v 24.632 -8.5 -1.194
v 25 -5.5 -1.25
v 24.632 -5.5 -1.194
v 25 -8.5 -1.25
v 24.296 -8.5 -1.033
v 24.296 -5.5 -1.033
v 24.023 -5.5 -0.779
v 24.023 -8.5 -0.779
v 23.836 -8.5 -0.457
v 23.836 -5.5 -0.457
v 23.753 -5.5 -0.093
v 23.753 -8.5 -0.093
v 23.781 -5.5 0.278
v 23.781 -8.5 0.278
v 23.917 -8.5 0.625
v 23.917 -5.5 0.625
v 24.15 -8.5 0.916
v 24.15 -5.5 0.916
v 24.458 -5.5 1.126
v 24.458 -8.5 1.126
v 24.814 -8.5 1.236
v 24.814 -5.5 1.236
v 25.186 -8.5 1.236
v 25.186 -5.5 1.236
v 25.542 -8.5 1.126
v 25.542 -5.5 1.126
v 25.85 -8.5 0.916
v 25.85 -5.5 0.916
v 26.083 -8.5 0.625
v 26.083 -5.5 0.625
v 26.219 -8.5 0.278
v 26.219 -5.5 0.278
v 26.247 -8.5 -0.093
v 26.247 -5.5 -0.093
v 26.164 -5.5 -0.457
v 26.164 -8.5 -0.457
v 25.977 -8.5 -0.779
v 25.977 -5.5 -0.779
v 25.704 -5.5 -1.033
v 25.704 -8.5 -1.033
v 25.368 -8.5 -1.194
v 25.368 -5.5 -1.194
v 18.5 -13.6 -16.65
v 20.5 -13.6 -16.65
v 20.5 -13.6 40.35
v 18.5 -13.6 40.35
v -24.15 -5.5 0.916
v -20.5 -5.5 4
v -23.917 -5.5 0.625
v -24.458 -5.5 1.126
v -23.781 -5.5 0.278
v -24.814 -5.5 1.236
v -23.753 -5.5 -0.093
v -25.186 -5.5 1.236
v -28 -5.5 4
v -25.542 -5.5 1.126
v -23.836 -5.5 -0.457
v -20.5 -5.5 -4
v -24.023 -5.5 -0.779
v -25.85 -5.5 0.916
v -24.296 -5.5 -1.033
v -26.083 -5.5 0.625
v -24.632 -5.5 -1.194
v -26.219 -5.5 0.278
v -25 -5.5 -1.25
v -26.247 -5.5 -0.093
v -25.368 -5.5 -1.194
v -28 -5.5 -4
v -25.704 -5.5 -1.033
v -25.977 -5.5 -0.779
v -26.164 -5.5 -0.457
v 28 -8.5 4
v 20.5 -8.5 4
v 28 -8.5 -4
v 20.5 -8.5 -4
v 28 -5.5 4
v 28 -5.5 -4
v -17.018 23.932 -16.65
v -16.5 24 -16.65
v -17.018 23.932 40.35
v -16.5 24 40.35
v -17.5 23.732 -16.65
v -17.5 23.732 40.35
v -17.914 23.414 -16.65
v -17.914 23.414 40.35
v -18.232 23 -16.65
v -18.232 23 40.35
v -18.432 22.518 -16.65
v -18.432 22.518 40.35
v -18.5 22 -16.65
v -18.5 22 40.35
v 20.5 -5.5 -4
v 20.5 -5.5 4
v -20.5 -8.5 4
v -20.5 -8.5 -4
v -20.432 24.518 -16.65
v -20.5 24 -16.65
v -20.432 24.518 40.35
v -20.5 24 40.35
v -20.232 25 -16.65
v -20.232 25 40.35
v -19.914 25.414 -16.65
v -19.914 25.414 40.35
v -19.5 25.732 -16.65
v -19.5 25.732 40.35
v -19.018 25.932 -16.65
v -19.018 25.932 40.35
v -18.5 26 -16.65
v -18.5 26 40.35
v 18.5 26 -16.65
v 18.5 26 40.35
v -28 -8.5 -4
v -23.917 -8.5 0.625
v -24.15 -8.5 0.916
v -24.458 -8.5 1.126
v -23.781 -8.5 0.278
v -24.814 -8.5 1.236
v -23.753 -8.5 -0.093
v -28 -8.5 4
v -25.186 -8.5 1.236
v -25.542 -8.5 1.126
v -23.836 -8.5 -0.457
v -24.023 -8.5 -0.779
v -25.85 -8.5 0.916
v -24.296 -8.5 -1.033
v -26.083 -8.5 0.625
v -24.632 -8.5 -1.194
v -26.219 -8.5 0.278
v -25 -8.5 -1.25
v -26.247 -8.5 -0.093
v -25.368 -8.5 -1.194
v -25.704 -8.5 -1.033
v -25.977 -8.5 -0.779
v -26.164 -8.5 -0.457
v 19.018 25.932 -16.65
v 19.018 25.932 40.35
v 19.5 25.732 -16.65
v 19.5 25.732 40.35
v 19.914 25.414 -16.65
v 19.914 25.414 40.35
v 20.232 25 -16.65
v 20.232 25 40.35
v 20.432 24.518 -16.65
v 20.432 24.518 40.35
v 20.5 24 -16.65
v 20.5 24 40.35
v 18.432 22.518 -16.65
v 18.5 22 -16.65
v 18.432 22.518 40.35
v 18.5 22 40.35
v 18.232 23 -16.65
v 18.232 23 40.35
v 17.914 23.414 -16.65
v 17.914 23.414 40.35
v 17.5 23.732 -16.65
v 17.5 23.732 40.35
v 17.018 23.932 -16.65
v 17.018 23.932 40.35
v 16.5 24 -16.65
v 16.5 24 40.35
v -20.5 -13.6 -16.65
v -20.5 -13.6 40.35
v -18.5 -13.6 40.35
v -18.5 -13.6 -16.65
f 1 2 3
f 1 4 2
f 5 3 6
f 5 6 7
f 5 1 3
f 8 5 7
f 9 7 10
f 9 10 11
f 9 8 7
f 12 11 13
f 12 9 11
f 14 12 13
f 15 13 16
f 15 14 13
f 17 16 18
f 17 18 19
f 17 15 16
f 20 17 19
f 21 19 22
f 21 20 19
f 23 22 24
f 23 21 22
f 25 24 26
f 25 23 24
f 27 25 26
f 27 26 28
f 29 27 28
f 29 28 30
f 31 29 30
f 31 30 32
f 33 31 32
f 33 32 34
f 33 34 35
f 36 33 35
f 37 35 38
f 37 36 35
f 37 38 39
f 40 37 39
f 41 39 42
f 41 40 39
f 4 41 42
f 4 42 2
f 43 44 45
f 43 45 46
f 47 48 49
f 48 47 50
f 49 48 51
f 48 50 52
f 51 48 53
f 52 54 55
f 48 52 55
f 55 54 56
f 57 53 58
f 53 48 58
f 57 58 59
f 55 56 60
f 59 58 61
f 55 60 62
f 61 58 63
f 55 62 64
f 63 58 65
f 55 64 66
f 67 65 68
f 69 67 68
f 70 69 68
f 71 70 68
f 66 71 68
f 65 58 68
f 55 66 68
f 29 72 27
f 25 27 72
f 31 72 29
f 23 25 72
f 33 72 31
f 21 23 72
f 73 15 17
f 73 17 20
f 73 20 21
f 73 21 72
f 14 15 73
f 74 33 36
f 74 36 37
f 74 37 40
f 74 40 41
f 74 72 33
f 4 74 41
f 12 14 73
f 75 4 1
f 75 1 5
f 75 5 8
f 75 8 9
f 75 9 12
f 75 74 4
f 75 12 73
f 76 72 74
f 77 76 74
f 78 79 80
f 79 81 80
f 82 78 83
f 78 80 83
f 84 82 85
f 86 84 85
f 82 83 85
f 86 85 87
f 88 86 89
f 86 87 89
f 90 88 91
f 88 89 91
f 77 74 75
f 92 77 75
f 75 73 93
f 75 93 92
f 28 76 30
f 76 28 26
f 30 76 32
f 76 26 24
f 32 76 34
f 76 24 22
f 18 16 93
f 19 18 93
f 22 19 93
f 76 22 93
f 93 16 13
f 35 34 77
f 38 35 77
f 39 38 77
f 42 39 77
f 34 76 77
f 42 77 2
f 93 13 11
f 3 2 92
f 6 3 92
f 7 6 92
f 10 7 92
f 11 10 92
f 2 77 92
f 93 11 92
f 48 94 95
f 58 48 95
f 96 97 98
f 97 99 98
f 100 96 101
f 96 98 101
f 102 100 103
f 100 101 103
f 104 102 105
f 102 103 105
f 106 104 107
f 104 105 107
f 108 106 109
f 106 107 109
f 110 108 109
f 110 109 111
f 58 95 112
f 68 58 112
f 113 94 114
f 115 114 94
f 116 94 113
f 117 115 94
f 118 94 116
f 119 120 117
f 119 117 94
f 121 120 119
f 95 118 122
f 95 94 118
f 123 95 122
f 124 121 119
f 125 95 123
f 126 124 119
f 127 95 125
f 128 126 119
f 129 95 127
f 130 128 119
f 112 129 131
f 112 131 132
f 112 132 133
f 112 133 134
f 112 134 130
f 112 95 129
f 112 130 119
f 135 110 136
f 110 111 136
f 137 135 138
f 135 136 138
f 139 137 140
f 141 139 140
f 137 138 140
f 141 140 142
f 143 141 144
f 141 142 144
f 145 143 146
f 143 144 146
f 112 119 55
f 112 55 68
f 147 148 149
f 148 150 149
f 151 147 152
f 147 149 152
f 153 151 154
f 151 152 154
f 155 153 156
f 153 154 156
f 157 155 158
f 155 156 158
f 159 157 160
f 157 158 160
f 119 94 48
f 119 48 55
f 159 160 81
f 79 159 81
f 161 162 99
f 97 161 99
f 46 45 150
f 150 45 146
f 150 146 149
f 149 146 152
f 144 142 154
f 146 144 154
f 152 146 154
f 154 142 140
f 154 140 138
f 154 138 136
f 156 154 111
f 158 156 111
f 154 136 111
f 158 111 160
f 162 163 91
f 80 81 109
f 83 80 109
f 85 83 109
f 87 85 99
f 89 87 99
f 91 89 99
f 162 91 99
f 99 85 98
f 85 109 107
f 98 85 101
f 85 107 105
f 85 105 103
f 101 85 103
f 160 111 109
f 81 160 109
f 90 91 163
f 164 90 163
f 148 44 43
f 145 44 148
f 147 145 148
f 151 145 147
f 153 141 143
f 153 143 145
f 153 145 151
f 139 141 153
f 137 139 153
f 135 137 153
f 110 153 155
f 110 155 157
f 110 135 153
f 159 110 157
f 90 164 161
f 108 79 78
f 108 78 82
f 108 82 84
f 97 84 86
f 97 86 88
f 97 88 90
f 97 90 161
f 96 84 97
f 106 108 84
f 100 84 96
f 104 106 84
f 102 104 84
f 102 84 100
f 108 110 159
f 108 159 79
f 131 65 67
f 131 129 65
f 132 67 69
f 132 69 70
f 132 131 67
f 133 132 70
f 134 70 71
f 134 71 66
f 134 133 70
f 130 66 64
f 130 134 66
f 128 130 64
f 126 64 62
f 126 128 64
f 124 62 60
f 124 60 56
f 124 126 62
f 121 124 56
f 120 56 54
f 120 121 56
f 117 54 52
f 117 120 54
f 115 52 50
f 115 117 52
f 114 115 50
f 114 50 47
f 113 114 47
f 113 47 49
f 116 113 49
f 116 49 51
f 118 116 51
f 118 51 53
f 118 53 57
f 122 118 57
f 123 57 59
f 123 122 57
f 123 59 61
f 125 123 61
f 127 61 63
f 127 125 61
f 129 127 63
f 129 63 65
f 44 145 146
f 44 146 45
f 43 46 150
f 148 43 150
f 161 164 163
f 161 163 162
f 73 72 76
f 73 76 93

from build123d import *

# Parameters (mm, degrees)
BOSS_EXTRUDE1_DEPTH            = 40.35
BOSS_EXTRUDE1_DEPTH_BACK       = 16.65
SKETCH2_W                      = 7.5
SKETCH2_H                      = 8
SKETCH2_R                      = 0.5
BOSS_EXTRUDE2_DEPTH            = 3
BOSS_EXTRUDE2_2_DEPTH          = 3
FILLET1_R                      = 2
M3X0_5_TAPPED_HOLE1_AT_2_COUNT = 2
M3X0_5_TAPPED_HOLE1_AT_2_PITCH = 50


with BuildPart() as part:
    # Sketch1 → Boss-Extrude1 (new, two sides: drawn at the far end of the back side and taken through both)
    with BuildSketch(Plane.XY.offset(-BOSS_EXTRUDE1_DEPTH_BACK)):
        Polygon((-20.5, -13.6), (-20.5, 26), (20.5, 26), (20.5, -13.6), (18.5, -13.6), (18.5, 24), (-18.5, 24), (-18.5, -13.6), align=None)
    extrude(amount=BOSS_EXTRUDE1_DEPTH + BOSS_EXTRUDE1_DEPTH_BACK)

    # Fillet1
    fillet1_edges = [part.edges().sort_by_distance(p)[0] for p in [
        (18.5, 24, 11.85),
        (-18.5, 24, 11.85),
        (-20.5, 26, 11.85),
        (20.5, 26, 11.85),
    ]]
    fillet(fillet1_edges, radius=FILLET1_R)


with BuildPart() as body_2:
    # Sketch2 → Boss-Extrude2 (new body)
    with BuildSketch(Plane(origin=(0, -8.5, 0), x_dir=(-1, 0, 0), z_dir=(0, -1, 0))):
        with Locations((-24.25, 0)):
            Rectangle(SKETCH2_W, SKETCH2_H)
        with Locations(Location((-25, 0, 0), (0, 0, 90))):
            Circle(SKETCH2_R, mode=Mode.SUBTRACT)
    extrude(amount=-BOSS_EXTRUDE2_DEPTH)


with BuildPart() as body_3:
    # Sketch2 → Boss-Extrude2 2 (new body)
    with BuildSketch(Plane(origin=(0, -8.5, 0), x_dir=(-1, 0, 0), z_dir=(0, -1, 0))):
        with Locations((24.25, 0)):
            Rectangle(SKETCH2_W, SKETCH2_H)
        with Locations(Location((25, 0, 0), (0, 0, 270))):
            Circle(SKETCH2_R, mode=Mode.SUBTRACT)
    extrude(amount=-BOSS_EXTRUDE2_2_DEPTH)

    # Sketch5 → M3x0.5 Tapped Hole1 (revolve, cut)
    with BuildSketch(Plane(origin=(-25, -8.5, 0), x_dir=(0, 0, -1), z_dir=(1, 0, 0))):
        Polygon((0, 0), (0, 3.751075774), (1.25, 3), (1.25, 0), align=None)
    m3x0_5_tapped_hole1 = revolve(axis=Axis((-25, -14.85, 0), (0, 1, 0)), mode=Mode.SUBTRACT)


with BuildPart() as body_2_1:
    add(body_2.part)

    # M3x0.5 Tapped Hole1 at 2: M3x0.5 Tapped Hole1 ×2
    with Locations(*[(i * M3X0_5_TAPPED_HOLE1_AT_2_PITCH, 0, 0) for i in range(1, M3X0_5_TAPPED_HOLE1_AT_2_COUNT)]):
        add(m3x0_5_tapped_hole1, mode=Mode.SUBTRACT)


solid = Compound([part.part, body_3.part, body_2_1.part])
